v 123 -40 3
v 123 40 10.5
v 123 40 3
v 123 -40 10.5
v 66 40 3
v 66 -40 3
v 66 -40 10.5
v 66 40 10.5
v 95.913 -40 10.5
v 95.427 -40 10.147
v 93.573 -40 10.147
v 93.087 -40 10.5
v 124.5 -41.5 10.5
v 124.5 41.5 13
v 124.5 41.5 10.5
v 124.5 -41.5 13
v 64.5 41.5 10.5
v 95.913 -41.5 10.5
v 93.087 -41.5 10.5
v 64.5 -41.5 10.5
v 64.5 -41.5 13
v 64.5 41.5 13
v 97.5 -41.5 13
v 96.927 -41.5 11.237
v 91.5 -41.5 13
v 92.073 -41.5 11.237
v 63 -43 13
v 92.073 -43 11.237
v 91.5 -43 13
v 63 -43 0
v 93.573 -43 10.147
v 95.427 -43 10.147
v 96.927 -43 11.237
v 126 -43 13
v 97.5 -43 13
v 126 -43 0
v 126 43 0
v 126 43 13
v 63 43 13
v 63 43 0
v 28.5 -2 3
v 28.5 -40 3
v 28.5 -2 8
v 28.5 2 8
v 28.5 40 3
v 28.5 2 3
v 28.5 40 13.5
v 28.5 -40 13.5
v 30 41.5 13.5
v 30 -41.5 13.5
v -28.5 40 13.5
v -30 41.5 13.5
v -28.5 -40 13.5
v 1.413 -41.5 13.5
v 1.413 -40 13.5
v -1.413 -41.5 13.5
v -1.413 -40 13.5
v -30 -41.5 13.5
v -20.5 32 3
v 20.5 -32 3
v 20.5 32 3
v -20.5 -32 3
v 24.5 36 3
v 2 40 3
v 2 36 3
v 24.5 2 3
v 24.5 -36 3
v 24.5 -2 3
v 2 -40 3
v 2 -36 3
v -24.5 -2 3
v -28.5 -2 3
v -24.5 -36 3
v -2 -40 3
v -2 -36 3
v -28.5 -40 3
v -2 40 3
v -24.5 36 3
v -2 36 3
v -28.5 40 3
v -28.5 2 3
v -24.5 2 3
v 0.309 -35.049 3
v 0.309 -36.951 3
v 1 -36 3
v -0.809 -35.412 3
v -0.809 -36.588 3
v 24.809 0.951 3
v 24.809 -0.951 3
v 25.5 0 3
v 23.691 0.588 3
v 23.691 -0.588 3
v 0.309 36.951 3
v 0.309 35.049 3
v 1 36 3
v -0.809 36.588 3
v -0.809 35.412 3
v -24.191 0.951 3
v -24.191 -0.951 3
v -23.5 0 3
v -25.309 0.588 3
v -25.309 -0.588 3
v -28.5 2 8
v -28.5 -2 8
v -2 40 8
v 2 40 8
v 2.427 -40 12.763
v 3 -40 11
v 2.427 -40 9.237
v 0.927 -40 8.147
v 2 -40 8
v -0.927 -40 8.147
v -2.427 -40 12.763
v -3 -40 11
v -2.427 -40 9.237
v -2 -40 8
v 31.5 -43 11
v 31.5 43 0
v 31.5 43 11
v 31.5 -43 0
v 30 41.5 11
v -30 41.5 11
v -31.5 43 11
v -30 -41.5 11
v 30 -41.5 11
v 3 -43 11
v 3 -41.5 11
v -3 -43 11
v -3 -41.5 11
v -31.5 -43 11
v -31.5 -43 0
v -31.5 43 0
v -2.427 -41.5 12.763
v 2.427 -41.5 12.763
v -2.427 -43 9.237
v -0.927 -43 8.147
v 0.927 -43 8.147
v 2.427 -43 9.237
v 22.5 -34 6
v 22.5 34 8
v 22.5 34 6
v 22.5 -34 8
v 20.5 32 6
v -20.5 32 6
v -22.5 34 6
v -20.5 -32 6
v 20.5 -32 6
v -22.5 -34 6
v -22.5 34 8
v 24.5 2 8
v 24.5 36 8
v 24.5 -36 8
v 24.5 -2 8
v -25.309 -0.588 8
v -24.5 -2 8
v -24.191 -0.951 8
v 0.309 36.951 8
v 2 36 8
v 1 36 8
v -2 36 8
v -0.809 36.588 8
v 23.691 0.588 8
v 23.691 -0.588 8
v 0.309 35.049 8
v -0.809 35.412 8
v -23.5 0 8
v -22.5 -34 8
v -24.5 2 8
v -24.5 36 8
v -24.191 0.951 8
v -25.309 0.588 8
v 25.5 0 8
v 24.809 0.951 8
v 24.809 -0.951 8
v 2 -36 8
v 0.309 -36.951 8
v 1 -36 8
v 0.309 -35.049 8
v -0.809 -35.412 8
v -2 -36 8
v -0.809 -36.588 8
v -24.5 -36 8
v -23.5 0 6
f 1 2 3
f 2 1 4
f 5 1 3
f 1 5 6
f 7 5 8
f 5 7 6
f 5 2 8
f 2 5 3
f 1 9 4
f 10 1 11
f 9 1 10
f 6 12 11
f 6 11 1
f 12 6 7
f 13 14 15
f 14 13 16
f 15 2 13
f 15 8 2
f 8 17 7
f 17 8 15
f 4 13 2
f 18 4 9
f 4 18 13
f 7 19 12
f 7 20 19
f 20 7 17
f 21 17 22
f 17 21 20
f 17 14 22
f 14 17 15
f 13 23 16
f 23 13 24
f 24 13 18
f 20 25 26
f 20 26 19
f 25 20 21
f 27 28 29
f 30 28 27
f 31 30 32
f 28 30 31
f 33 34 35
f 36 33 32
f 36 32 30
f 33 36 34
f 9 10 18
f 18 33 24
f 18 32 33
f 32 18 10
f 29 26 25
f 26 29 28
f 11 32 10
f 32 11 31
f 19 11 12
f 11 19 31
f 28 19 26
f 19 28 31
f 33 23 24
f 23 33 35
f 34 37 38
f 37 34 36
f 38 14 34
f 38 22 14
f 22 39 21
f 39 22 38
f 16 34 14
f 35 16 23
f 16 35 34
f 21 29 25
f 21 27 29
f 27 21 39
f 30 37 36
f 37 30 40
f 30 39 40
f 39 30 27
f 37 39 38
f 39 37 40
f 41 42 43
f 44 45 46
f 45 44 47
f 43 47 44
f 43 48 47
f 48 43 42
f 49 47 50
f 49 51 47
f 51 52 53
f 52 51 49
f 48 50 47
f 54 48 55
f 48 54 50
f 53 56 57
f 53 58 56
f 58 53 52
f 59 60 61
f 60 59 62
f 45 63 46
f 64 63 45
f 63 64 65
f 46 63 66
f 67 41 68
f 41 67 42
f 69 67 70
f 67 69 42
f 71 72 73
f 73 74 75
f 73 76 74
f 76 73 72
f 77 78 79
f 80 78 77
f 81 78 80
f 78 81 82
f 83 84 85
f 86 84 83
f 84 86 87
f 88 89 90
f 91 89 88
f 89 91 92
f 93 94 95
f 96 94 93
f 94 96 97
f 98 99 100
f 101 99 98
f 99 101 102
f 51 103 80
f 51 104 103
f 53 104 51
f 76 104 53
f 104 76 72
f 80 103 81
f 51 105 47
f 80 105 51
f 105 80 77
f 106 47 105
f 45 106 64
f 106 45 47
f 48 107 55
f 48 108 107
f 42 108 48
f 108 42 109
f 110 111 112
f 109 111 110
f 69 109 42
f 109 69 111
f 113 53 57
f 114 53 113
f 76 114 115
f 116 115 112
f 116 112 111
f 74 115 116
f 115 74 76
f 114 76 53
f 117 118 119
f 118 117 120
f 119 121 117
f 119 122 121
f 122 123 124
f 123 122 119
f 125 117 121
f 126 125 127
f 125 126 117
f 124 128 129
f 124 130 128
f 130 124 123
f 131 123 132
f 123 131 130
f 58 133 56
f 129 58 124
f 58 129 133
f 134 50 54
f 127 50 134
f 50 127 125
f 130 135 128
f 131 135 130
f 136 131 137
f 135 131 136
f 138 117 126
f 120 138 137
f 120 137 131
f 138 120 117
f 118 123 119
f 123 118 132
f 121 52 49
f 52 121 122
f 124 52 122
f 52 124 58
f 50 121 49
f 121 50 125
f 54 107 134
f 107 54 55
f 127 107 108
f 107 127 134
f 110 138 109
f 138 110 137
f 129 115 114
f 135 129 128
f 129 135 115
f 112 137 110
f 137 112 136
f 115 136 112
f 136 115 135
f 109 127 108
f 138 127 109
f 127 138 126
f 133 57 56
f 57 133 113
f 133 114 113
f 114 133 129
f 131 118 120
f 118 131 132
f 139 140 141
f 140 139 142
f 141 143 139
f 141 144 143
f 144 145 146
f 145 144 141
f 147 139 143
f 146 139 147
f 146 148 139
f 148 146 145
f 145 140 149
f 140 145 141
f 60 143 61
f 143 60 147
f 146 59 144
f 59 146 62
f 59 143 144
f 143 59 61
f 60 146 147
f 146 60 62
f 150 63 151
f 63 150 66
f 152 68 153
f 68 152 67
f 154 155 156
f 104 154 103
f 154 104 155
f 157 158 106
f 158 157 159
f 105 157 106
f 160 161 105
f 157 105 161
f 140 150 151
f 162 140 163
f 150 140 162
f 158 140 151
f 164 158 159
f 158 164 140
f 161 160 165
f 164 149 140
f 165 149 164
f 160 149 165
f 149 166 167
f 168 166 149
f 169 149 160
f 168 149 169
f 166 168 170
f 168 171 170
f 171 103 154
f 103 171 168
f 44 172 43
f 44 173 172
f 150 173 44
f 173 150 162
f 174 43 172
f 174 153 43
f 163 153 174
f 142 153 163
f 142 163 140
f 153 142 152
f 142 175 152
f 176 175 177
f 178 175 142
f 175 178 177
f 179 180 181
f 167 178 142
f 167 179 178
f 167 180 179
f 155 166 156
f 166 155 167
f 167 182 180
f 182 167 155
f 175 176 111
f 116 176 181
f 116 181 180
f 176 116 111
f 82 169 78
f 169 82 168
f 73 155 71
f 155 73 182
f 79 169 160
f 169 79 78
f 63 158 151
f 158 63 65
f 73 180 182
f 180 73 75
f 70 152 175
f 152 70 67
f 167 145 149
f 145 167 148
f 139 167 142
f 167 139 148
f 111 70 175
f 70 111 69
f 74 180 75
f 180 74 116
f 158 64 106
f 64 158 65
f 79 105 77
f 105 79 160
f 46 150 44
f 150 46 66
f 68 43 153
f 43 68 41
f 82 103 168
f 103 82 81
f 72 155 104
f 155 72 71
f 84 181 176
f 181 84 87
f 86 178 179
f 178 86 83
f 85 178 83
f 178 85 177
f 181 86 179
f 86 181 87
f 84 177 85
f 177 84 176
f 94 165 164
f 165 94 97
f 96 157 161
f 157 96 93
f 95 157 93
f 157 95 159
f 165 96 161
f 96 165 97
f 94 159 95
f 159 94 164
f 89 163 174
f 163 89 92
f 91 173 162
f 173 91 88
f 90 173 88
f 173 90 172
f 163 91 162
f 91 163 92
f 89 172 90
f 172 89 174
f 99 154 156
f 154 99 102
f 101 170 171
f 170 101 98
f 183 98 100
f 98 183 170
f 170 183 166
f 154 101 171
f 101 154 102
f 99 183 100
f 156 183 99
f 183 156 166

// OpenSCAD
// CSG.scad - Basic example of CSG usage
//$fn=8; // draft
//$fn=50; // activate once happy with the design

// GENERATION OPTIONS

// set to 1 will generate upper box, 0 will skip it
generate_upper=1;
// set to 1 will generate lower box, 0 will skip it
generate_lower=1;

// DIMENSIONS //

// pcb dimensions, height with components
pcb = [45,68,15]; 
// just the PCB height, for the claming
pcb_height = 2; 

// WALLS //

// outer wall thickness
owt = 3; 
// inner wall thickness
iwt = 2; 

// Sidewall DRILLS //

// radius (!) of the drills
cable_drills = 3; 
// positions list on the bottom 
//y_drills_bot = [10-22.25,30-22.25]; // position
y_drills_bot = [0]; // position
// positions list on the top
y_drills_top = []; 
// positions list on the left side
x_drills_left = []; 
// positions list on the right side
x_drills_right = []; 

//////// LOWER box settings //////// 

// set to 1 if you want four claming blocks
with_clamping= 1;
// size of the clamping block
clamp_size = 4;
// radius(!) of the drill in the clamping block
clamp_size_drill = 1;

// free space under the PCB, e.g. for bottom side components
space_below = 3;

// number of extra standoffs under the pcb, increase for large pcb's
extra_standups = 0;

// set to 1 to add flanges to the box, e.g. to screw it on to something
with_flange = 0;

// flange drill size, radius(!) of the drill size
flange_drill = 2.5; // M5

/////// UPPER box settings //////

// radius (!) of the drills in the top, set to 0 for no drills 
lid_drill=0; 

// compensate shrinkage, positiv value will make the lid smaller, keep this small e.g. 0.25
shrinkage = 0;


// total height of both boxes musst be: top+pcb.z+space below+bottom=2*owt+pcb.z+space_below
// lower box out wall height is owt+(pcb.z/2+space_below)/2
// so upper box must be: otw+3/4*pcb.z+space_below/2

// total inner height is simply, pcb.z+space_below+2xowt
// lower box inner wall is: pcb.z/2+space_below+owt
// so upper box inner wall height is pcb.z/2+owt
// don't change
lower_box = [pcb.x+with_clamping*2*clamp_size+2*iwt+2*owt,pcb.y+with_clamping*2*clamp_size+2*iwt+2*owt,pcb.z/2+space_below+owt];

upper_box = [lower_box.x,lower_box.y,owt+pcb.z -(pcb_height+cable_drills)];

if(generate_upper){
    translate([lower_box.x+upper_box.x/2,0,0]) {  // comment this to flip the box on top of each other for testing
    //translate([0,0,upper_box.z+owt+iwt+space_below+cable_drills]) {  // uncomment this to flip the box on top of each other for testing
    //rotate([0,180,0]){// uncomment this to flip the box on top of each other for testing
        union(){
            difference(){
                // base cube
                translate([-upper_box.x/2,-upper_box.y/2,0]) {
                    cube(upper_box);
                }
                union(){
					// remove main inside
                    translate([-upper_box.x/2+owt,-upper_box.y/2+owt,owt]) {
                        cube([upper_box.x-2*owt,upper_box.y-2*owt,upper_box.z-owt]);
                    }
					// remove upper, smaller part
                    translate([-upper_box.x/2+1/2*owt-shrinkage,-upper_box.y/2+1/2*owt-shrinkage,owt+1/2*pcb.z]) {
                        cube([upper_box.x-owt+2*shrinkage,upper_box.y-owt+2*shrinkage,1/4*pcb.z+space_below/2]);
                    }
                    
                    if(lid_drill>0){
                        step_x=floor((upper_box.x-2*owt-2*lid_drill)/(lid_drill*3));
                        start_x=step_x/2*3*lid_drill;
                        
                        step_y=floor((upper_box.y-2*owt-2*lid_drill)/(lid_drill*3));
                        start_y=step_y/2*3*lid_drill;
                        
                        for(y = [0:1:step_y]){
                            for(x = [0:1:step_x]){
                                translate([-start_x+x*lid_drill*3,-start_y+y*lid_drill*3,0]){
                                    cylinder(h=owt, r=lid_drill);
                                }
                            }
                        }
                    }
                                    
                    // drills in the sizes
                    for(a = y_drills_bot){
                        translate([-a,-upper_box.y/2+owt,pcb.z-pcb_height]){
                            rotate([90,0,0]){
                                cylinder(h=owt, r=cable_drills);
                            }
                        }
                    }
                    for(b = y_drills_top){
                        translate([-b,+upper_box.y/2,pcb.z-pcb_height]){
                            rotate([90,0,0]){
                                cylinder(h=owt, r=cable_drills);
                            }
                        }
                    }
                    for(b = x_drills_left){
                        translate([upper_box.x/2-owt,b,pcb.z-pcb_height]){
                            rotate([0,90,0]){
                                cylinder(h=owt, r=cable_drills);
                            }
                        }
                    }
                    for(b = x_drills_right){
                        translate([-upper_box.x/2,b,pcb.z-pcb_height]){
                            rotate([0,90,0]){
                                cylinder(h=owt, r=cable_drills);
                            }
                        }
                    }
                }
            }
        }
    //}// uncomment this to flip the box on top of each other for testing
    //}// uncomment this to flip the box on top of each other for testing
    }
}

if(generate_lower){
    // lower box
    union(){
        difference(){ // base box - (inner cube - walls around)
            union(){
                // base cube
                translate([-lower_box.x/2,-lower_box.y/2,0]) {
                    cube(lower_box);
                }
            }
            
            union(){
                // inner cube
                translate([-(lower_box.x/2-owt),-(lower_box.y/2-owt),owt]) {
                    cube([lower_box.x-owt*2,lower_box.y-owt*2,lower_box.z-owt]);
                }
                // remove 4 half - walls
                translate([-lower_box.x/2,-lower_box.y/2,space_below+pcb_height+owt+cable_drills]) {
                    cube([lower_box.x,owt/2,pcb.z/2-(pcb_height+cable_drills)]);
                }
                translate([-lower_box.x/2,lower_box.y/2-owt/2,space_below+pcb_height+owt+cable_drills]) {
                    cube([lower_box.x,owt/2,pcb.z/2-(pcb_height+cable_drills)]);
                }
                translate([-lower_box.x/2,-lower_box.y/2-owt/2,space_below+pcb_height+owt+cable_drills]) {
                    cube([owt/2,lower_box.y,pcb.z/2-(pcb_height+cable_drills)]);
                }
                translate([lower_box.x/2-owt/2,-lower_box.y/2-owt/2,space_below+pcb_height+owt+cable_drills]) {
                    cube([owt/2,lower_box.y,pcb.z/2-(pcb_height+cable_drills)]);
                }
                
                // drills for cable
                for(a = y_drills_bot){
                    translate([a,-lower_box.y/2+owt,cable_drills+space_below+pcb_height+owt]){
                        rotate([90,0,0]){
                            cylinder(h=owt, r=cable_drills);
                        }
                    }
                }
                for(b = y_drills_top){
                    translate([b,+lower_box.y/2,cable_drills+space_below+pcb_height+owt]){
                        rotate([90,0,0]){
                            cylinder(h=owt, r=cable_drills);
                        }
                    }
                }
                for(b = x_drills_left){
                    translate([-lower_box.x/2,b,cable_drills+space_below+pcb_height+owt]){
                        rotate([0,90,0]){
                            cylinder(h=owt, r=cable_drills);
                        }
                    }
                }
                for(b = x_drills_right){
                    translate([lower_box.x/2-owt,b,cable_drills+space_below+pcb_height+owt]){
                        rotate([0,90,0]){
                            cylinder(h=owt, r=cable_drills);
                        }
                    }
                }
                // end if drills for cable
            } // end of union
        } // end of difference, outer box done.
        
        // inner parts // 
        
        // stand off 
        translate([-pcb.x/2,-pcb.y/2,owt]){
            // outer frame, directly under the border of the PCB
            difference(){
                cube([pcb.x,pcb.y,space_below]);
                translate([iwt,iwt,0]){
                    cube([pcb.x-2*iwt,pcb.y-2*iwt,space_below]);
                }
            }
            // add support standoffs if extra_standoffs > 0
            for(a = [0:1:extra_standups]){
                translate([a*pcb.x/(extra_standups+1)-iwt/2,0,0]){
                    cube([iwt,pcb.y,space_below]);
                }
                translate([0,a*pcb.y/(extra_standups+1)-iwt/2,0]){
                    cube([pcb.x,iwt,space_below]);
                }
            }
            
        }

        // (frame around stand off + clamping) - drills
        difference(){ 
            union(){
                // frame around standoff
                translate([-pcb.x/2-iwt,-pcb.y/2-iwt,owt]){
                    difference(){
                        cube([pcb.x+2*iwt,pcb.y+2*iwt,space_below+pcb_height]);
                        translate([iwt,iwt,0]){
                            cube([pcb.x,pcb.y,space_below+pcb_height]);
                        }
                    }
                }
                // blocks for claming
                if(with_clamping){
                    // bottom
                    translate([-clamp_size/2,-pcb.y/2-clamp_size-iwt,owt]){
                        cube([clamp_size,clamp_size,space_below+pcb_height]);
                    }
                    // top
                    translate([-clamp_size/2,+pcb.y/2+iwt,owt]){
                        cube([clamp_size,clamp_size,space_below+pcb_height]);
                    }
                    // right
                    translate([+pcb.x/2+iwt,-clamp_size/2,owt]){
                        cube([clamp_size,clamp_size,space_below+pcb_height]);
                    }
                    // left
                    translate([-pcb.x/2-iwt-clamp_size,-clamp_size/2,owt]){
                        cube([clamp_size,clamp_size,space_below+pcb_height]);
                    }
                } // end of blocks 
            }
            // drills in claming blocks
            if(with_clamping && clamp_size_drill>0){
                union(){
                    // bottom
                    translate([0,-pcb.y/2-iwt,owt]){
                        cylinder(h=space_below+pcb_height, r=clamp_size_drill);
                    }
                    // top
                    translate([0,+pcb.y/2+iwt,owt]){
                        cylinder(h=space_below+pcb_height, r=clamp_size_drill);
                    }
                    // right
                    translate([+pcb.x/2+iwt,0,owt]){
                        cylinder(h=space_below+pcb_height, r=clamp_size_drill);
                    }
                    // left
                    translate([-pcb.x/2-iwt,0,owt]){
                        cylinder(h=space_below+pcb_height, r=clamp_size_drill);
                    }
                } // drill union
            } // end of drills
        } // difference
        
        // add falge
        // radius of screw = flange_drill. Screw head radius is ~1.8x screw radius. lets say 2.5 to give some space
        if(with_flange){
            union(){
                flange_pos_x = [-lower_box.x/2-2*2.5*flange_drill,+lower_box.x/2];
                for(p=flange_pos_x){
                    translate([p,-lower_box.y/2,0]){
                        difference(){
                            cube([2*2.5*flange_drill,lower_box.y,owt]);
                            // upper screw
                            translate([2.5*flange_drill,lower_box.y/5,0]){
                                // head sink
                                translate([0,0,owt/3*2]){
                                    cylinder(h=owt/3, r=flange_drill*1.8);
                                }
                                // throughhole
                                cylinder(h=owt, r=flange_drill);
                            }
                            // lower screw
                            translate([2.5*flange_drill,lower_box.y*4/5,0]){
                                // head sink
                                translate([0,0,owt/3*2]){
                                    cylinder(h=owt/3, r=flange_drill*1.8);
                                }
                                // throughhole
                                cylinder(h=owt, r=flange_drill);
                            }
                        } // remove screw holes from flange
                    } // left and right
                } // for the two positions
            } // union, needed?
        } // if with flange
        
    }
}
